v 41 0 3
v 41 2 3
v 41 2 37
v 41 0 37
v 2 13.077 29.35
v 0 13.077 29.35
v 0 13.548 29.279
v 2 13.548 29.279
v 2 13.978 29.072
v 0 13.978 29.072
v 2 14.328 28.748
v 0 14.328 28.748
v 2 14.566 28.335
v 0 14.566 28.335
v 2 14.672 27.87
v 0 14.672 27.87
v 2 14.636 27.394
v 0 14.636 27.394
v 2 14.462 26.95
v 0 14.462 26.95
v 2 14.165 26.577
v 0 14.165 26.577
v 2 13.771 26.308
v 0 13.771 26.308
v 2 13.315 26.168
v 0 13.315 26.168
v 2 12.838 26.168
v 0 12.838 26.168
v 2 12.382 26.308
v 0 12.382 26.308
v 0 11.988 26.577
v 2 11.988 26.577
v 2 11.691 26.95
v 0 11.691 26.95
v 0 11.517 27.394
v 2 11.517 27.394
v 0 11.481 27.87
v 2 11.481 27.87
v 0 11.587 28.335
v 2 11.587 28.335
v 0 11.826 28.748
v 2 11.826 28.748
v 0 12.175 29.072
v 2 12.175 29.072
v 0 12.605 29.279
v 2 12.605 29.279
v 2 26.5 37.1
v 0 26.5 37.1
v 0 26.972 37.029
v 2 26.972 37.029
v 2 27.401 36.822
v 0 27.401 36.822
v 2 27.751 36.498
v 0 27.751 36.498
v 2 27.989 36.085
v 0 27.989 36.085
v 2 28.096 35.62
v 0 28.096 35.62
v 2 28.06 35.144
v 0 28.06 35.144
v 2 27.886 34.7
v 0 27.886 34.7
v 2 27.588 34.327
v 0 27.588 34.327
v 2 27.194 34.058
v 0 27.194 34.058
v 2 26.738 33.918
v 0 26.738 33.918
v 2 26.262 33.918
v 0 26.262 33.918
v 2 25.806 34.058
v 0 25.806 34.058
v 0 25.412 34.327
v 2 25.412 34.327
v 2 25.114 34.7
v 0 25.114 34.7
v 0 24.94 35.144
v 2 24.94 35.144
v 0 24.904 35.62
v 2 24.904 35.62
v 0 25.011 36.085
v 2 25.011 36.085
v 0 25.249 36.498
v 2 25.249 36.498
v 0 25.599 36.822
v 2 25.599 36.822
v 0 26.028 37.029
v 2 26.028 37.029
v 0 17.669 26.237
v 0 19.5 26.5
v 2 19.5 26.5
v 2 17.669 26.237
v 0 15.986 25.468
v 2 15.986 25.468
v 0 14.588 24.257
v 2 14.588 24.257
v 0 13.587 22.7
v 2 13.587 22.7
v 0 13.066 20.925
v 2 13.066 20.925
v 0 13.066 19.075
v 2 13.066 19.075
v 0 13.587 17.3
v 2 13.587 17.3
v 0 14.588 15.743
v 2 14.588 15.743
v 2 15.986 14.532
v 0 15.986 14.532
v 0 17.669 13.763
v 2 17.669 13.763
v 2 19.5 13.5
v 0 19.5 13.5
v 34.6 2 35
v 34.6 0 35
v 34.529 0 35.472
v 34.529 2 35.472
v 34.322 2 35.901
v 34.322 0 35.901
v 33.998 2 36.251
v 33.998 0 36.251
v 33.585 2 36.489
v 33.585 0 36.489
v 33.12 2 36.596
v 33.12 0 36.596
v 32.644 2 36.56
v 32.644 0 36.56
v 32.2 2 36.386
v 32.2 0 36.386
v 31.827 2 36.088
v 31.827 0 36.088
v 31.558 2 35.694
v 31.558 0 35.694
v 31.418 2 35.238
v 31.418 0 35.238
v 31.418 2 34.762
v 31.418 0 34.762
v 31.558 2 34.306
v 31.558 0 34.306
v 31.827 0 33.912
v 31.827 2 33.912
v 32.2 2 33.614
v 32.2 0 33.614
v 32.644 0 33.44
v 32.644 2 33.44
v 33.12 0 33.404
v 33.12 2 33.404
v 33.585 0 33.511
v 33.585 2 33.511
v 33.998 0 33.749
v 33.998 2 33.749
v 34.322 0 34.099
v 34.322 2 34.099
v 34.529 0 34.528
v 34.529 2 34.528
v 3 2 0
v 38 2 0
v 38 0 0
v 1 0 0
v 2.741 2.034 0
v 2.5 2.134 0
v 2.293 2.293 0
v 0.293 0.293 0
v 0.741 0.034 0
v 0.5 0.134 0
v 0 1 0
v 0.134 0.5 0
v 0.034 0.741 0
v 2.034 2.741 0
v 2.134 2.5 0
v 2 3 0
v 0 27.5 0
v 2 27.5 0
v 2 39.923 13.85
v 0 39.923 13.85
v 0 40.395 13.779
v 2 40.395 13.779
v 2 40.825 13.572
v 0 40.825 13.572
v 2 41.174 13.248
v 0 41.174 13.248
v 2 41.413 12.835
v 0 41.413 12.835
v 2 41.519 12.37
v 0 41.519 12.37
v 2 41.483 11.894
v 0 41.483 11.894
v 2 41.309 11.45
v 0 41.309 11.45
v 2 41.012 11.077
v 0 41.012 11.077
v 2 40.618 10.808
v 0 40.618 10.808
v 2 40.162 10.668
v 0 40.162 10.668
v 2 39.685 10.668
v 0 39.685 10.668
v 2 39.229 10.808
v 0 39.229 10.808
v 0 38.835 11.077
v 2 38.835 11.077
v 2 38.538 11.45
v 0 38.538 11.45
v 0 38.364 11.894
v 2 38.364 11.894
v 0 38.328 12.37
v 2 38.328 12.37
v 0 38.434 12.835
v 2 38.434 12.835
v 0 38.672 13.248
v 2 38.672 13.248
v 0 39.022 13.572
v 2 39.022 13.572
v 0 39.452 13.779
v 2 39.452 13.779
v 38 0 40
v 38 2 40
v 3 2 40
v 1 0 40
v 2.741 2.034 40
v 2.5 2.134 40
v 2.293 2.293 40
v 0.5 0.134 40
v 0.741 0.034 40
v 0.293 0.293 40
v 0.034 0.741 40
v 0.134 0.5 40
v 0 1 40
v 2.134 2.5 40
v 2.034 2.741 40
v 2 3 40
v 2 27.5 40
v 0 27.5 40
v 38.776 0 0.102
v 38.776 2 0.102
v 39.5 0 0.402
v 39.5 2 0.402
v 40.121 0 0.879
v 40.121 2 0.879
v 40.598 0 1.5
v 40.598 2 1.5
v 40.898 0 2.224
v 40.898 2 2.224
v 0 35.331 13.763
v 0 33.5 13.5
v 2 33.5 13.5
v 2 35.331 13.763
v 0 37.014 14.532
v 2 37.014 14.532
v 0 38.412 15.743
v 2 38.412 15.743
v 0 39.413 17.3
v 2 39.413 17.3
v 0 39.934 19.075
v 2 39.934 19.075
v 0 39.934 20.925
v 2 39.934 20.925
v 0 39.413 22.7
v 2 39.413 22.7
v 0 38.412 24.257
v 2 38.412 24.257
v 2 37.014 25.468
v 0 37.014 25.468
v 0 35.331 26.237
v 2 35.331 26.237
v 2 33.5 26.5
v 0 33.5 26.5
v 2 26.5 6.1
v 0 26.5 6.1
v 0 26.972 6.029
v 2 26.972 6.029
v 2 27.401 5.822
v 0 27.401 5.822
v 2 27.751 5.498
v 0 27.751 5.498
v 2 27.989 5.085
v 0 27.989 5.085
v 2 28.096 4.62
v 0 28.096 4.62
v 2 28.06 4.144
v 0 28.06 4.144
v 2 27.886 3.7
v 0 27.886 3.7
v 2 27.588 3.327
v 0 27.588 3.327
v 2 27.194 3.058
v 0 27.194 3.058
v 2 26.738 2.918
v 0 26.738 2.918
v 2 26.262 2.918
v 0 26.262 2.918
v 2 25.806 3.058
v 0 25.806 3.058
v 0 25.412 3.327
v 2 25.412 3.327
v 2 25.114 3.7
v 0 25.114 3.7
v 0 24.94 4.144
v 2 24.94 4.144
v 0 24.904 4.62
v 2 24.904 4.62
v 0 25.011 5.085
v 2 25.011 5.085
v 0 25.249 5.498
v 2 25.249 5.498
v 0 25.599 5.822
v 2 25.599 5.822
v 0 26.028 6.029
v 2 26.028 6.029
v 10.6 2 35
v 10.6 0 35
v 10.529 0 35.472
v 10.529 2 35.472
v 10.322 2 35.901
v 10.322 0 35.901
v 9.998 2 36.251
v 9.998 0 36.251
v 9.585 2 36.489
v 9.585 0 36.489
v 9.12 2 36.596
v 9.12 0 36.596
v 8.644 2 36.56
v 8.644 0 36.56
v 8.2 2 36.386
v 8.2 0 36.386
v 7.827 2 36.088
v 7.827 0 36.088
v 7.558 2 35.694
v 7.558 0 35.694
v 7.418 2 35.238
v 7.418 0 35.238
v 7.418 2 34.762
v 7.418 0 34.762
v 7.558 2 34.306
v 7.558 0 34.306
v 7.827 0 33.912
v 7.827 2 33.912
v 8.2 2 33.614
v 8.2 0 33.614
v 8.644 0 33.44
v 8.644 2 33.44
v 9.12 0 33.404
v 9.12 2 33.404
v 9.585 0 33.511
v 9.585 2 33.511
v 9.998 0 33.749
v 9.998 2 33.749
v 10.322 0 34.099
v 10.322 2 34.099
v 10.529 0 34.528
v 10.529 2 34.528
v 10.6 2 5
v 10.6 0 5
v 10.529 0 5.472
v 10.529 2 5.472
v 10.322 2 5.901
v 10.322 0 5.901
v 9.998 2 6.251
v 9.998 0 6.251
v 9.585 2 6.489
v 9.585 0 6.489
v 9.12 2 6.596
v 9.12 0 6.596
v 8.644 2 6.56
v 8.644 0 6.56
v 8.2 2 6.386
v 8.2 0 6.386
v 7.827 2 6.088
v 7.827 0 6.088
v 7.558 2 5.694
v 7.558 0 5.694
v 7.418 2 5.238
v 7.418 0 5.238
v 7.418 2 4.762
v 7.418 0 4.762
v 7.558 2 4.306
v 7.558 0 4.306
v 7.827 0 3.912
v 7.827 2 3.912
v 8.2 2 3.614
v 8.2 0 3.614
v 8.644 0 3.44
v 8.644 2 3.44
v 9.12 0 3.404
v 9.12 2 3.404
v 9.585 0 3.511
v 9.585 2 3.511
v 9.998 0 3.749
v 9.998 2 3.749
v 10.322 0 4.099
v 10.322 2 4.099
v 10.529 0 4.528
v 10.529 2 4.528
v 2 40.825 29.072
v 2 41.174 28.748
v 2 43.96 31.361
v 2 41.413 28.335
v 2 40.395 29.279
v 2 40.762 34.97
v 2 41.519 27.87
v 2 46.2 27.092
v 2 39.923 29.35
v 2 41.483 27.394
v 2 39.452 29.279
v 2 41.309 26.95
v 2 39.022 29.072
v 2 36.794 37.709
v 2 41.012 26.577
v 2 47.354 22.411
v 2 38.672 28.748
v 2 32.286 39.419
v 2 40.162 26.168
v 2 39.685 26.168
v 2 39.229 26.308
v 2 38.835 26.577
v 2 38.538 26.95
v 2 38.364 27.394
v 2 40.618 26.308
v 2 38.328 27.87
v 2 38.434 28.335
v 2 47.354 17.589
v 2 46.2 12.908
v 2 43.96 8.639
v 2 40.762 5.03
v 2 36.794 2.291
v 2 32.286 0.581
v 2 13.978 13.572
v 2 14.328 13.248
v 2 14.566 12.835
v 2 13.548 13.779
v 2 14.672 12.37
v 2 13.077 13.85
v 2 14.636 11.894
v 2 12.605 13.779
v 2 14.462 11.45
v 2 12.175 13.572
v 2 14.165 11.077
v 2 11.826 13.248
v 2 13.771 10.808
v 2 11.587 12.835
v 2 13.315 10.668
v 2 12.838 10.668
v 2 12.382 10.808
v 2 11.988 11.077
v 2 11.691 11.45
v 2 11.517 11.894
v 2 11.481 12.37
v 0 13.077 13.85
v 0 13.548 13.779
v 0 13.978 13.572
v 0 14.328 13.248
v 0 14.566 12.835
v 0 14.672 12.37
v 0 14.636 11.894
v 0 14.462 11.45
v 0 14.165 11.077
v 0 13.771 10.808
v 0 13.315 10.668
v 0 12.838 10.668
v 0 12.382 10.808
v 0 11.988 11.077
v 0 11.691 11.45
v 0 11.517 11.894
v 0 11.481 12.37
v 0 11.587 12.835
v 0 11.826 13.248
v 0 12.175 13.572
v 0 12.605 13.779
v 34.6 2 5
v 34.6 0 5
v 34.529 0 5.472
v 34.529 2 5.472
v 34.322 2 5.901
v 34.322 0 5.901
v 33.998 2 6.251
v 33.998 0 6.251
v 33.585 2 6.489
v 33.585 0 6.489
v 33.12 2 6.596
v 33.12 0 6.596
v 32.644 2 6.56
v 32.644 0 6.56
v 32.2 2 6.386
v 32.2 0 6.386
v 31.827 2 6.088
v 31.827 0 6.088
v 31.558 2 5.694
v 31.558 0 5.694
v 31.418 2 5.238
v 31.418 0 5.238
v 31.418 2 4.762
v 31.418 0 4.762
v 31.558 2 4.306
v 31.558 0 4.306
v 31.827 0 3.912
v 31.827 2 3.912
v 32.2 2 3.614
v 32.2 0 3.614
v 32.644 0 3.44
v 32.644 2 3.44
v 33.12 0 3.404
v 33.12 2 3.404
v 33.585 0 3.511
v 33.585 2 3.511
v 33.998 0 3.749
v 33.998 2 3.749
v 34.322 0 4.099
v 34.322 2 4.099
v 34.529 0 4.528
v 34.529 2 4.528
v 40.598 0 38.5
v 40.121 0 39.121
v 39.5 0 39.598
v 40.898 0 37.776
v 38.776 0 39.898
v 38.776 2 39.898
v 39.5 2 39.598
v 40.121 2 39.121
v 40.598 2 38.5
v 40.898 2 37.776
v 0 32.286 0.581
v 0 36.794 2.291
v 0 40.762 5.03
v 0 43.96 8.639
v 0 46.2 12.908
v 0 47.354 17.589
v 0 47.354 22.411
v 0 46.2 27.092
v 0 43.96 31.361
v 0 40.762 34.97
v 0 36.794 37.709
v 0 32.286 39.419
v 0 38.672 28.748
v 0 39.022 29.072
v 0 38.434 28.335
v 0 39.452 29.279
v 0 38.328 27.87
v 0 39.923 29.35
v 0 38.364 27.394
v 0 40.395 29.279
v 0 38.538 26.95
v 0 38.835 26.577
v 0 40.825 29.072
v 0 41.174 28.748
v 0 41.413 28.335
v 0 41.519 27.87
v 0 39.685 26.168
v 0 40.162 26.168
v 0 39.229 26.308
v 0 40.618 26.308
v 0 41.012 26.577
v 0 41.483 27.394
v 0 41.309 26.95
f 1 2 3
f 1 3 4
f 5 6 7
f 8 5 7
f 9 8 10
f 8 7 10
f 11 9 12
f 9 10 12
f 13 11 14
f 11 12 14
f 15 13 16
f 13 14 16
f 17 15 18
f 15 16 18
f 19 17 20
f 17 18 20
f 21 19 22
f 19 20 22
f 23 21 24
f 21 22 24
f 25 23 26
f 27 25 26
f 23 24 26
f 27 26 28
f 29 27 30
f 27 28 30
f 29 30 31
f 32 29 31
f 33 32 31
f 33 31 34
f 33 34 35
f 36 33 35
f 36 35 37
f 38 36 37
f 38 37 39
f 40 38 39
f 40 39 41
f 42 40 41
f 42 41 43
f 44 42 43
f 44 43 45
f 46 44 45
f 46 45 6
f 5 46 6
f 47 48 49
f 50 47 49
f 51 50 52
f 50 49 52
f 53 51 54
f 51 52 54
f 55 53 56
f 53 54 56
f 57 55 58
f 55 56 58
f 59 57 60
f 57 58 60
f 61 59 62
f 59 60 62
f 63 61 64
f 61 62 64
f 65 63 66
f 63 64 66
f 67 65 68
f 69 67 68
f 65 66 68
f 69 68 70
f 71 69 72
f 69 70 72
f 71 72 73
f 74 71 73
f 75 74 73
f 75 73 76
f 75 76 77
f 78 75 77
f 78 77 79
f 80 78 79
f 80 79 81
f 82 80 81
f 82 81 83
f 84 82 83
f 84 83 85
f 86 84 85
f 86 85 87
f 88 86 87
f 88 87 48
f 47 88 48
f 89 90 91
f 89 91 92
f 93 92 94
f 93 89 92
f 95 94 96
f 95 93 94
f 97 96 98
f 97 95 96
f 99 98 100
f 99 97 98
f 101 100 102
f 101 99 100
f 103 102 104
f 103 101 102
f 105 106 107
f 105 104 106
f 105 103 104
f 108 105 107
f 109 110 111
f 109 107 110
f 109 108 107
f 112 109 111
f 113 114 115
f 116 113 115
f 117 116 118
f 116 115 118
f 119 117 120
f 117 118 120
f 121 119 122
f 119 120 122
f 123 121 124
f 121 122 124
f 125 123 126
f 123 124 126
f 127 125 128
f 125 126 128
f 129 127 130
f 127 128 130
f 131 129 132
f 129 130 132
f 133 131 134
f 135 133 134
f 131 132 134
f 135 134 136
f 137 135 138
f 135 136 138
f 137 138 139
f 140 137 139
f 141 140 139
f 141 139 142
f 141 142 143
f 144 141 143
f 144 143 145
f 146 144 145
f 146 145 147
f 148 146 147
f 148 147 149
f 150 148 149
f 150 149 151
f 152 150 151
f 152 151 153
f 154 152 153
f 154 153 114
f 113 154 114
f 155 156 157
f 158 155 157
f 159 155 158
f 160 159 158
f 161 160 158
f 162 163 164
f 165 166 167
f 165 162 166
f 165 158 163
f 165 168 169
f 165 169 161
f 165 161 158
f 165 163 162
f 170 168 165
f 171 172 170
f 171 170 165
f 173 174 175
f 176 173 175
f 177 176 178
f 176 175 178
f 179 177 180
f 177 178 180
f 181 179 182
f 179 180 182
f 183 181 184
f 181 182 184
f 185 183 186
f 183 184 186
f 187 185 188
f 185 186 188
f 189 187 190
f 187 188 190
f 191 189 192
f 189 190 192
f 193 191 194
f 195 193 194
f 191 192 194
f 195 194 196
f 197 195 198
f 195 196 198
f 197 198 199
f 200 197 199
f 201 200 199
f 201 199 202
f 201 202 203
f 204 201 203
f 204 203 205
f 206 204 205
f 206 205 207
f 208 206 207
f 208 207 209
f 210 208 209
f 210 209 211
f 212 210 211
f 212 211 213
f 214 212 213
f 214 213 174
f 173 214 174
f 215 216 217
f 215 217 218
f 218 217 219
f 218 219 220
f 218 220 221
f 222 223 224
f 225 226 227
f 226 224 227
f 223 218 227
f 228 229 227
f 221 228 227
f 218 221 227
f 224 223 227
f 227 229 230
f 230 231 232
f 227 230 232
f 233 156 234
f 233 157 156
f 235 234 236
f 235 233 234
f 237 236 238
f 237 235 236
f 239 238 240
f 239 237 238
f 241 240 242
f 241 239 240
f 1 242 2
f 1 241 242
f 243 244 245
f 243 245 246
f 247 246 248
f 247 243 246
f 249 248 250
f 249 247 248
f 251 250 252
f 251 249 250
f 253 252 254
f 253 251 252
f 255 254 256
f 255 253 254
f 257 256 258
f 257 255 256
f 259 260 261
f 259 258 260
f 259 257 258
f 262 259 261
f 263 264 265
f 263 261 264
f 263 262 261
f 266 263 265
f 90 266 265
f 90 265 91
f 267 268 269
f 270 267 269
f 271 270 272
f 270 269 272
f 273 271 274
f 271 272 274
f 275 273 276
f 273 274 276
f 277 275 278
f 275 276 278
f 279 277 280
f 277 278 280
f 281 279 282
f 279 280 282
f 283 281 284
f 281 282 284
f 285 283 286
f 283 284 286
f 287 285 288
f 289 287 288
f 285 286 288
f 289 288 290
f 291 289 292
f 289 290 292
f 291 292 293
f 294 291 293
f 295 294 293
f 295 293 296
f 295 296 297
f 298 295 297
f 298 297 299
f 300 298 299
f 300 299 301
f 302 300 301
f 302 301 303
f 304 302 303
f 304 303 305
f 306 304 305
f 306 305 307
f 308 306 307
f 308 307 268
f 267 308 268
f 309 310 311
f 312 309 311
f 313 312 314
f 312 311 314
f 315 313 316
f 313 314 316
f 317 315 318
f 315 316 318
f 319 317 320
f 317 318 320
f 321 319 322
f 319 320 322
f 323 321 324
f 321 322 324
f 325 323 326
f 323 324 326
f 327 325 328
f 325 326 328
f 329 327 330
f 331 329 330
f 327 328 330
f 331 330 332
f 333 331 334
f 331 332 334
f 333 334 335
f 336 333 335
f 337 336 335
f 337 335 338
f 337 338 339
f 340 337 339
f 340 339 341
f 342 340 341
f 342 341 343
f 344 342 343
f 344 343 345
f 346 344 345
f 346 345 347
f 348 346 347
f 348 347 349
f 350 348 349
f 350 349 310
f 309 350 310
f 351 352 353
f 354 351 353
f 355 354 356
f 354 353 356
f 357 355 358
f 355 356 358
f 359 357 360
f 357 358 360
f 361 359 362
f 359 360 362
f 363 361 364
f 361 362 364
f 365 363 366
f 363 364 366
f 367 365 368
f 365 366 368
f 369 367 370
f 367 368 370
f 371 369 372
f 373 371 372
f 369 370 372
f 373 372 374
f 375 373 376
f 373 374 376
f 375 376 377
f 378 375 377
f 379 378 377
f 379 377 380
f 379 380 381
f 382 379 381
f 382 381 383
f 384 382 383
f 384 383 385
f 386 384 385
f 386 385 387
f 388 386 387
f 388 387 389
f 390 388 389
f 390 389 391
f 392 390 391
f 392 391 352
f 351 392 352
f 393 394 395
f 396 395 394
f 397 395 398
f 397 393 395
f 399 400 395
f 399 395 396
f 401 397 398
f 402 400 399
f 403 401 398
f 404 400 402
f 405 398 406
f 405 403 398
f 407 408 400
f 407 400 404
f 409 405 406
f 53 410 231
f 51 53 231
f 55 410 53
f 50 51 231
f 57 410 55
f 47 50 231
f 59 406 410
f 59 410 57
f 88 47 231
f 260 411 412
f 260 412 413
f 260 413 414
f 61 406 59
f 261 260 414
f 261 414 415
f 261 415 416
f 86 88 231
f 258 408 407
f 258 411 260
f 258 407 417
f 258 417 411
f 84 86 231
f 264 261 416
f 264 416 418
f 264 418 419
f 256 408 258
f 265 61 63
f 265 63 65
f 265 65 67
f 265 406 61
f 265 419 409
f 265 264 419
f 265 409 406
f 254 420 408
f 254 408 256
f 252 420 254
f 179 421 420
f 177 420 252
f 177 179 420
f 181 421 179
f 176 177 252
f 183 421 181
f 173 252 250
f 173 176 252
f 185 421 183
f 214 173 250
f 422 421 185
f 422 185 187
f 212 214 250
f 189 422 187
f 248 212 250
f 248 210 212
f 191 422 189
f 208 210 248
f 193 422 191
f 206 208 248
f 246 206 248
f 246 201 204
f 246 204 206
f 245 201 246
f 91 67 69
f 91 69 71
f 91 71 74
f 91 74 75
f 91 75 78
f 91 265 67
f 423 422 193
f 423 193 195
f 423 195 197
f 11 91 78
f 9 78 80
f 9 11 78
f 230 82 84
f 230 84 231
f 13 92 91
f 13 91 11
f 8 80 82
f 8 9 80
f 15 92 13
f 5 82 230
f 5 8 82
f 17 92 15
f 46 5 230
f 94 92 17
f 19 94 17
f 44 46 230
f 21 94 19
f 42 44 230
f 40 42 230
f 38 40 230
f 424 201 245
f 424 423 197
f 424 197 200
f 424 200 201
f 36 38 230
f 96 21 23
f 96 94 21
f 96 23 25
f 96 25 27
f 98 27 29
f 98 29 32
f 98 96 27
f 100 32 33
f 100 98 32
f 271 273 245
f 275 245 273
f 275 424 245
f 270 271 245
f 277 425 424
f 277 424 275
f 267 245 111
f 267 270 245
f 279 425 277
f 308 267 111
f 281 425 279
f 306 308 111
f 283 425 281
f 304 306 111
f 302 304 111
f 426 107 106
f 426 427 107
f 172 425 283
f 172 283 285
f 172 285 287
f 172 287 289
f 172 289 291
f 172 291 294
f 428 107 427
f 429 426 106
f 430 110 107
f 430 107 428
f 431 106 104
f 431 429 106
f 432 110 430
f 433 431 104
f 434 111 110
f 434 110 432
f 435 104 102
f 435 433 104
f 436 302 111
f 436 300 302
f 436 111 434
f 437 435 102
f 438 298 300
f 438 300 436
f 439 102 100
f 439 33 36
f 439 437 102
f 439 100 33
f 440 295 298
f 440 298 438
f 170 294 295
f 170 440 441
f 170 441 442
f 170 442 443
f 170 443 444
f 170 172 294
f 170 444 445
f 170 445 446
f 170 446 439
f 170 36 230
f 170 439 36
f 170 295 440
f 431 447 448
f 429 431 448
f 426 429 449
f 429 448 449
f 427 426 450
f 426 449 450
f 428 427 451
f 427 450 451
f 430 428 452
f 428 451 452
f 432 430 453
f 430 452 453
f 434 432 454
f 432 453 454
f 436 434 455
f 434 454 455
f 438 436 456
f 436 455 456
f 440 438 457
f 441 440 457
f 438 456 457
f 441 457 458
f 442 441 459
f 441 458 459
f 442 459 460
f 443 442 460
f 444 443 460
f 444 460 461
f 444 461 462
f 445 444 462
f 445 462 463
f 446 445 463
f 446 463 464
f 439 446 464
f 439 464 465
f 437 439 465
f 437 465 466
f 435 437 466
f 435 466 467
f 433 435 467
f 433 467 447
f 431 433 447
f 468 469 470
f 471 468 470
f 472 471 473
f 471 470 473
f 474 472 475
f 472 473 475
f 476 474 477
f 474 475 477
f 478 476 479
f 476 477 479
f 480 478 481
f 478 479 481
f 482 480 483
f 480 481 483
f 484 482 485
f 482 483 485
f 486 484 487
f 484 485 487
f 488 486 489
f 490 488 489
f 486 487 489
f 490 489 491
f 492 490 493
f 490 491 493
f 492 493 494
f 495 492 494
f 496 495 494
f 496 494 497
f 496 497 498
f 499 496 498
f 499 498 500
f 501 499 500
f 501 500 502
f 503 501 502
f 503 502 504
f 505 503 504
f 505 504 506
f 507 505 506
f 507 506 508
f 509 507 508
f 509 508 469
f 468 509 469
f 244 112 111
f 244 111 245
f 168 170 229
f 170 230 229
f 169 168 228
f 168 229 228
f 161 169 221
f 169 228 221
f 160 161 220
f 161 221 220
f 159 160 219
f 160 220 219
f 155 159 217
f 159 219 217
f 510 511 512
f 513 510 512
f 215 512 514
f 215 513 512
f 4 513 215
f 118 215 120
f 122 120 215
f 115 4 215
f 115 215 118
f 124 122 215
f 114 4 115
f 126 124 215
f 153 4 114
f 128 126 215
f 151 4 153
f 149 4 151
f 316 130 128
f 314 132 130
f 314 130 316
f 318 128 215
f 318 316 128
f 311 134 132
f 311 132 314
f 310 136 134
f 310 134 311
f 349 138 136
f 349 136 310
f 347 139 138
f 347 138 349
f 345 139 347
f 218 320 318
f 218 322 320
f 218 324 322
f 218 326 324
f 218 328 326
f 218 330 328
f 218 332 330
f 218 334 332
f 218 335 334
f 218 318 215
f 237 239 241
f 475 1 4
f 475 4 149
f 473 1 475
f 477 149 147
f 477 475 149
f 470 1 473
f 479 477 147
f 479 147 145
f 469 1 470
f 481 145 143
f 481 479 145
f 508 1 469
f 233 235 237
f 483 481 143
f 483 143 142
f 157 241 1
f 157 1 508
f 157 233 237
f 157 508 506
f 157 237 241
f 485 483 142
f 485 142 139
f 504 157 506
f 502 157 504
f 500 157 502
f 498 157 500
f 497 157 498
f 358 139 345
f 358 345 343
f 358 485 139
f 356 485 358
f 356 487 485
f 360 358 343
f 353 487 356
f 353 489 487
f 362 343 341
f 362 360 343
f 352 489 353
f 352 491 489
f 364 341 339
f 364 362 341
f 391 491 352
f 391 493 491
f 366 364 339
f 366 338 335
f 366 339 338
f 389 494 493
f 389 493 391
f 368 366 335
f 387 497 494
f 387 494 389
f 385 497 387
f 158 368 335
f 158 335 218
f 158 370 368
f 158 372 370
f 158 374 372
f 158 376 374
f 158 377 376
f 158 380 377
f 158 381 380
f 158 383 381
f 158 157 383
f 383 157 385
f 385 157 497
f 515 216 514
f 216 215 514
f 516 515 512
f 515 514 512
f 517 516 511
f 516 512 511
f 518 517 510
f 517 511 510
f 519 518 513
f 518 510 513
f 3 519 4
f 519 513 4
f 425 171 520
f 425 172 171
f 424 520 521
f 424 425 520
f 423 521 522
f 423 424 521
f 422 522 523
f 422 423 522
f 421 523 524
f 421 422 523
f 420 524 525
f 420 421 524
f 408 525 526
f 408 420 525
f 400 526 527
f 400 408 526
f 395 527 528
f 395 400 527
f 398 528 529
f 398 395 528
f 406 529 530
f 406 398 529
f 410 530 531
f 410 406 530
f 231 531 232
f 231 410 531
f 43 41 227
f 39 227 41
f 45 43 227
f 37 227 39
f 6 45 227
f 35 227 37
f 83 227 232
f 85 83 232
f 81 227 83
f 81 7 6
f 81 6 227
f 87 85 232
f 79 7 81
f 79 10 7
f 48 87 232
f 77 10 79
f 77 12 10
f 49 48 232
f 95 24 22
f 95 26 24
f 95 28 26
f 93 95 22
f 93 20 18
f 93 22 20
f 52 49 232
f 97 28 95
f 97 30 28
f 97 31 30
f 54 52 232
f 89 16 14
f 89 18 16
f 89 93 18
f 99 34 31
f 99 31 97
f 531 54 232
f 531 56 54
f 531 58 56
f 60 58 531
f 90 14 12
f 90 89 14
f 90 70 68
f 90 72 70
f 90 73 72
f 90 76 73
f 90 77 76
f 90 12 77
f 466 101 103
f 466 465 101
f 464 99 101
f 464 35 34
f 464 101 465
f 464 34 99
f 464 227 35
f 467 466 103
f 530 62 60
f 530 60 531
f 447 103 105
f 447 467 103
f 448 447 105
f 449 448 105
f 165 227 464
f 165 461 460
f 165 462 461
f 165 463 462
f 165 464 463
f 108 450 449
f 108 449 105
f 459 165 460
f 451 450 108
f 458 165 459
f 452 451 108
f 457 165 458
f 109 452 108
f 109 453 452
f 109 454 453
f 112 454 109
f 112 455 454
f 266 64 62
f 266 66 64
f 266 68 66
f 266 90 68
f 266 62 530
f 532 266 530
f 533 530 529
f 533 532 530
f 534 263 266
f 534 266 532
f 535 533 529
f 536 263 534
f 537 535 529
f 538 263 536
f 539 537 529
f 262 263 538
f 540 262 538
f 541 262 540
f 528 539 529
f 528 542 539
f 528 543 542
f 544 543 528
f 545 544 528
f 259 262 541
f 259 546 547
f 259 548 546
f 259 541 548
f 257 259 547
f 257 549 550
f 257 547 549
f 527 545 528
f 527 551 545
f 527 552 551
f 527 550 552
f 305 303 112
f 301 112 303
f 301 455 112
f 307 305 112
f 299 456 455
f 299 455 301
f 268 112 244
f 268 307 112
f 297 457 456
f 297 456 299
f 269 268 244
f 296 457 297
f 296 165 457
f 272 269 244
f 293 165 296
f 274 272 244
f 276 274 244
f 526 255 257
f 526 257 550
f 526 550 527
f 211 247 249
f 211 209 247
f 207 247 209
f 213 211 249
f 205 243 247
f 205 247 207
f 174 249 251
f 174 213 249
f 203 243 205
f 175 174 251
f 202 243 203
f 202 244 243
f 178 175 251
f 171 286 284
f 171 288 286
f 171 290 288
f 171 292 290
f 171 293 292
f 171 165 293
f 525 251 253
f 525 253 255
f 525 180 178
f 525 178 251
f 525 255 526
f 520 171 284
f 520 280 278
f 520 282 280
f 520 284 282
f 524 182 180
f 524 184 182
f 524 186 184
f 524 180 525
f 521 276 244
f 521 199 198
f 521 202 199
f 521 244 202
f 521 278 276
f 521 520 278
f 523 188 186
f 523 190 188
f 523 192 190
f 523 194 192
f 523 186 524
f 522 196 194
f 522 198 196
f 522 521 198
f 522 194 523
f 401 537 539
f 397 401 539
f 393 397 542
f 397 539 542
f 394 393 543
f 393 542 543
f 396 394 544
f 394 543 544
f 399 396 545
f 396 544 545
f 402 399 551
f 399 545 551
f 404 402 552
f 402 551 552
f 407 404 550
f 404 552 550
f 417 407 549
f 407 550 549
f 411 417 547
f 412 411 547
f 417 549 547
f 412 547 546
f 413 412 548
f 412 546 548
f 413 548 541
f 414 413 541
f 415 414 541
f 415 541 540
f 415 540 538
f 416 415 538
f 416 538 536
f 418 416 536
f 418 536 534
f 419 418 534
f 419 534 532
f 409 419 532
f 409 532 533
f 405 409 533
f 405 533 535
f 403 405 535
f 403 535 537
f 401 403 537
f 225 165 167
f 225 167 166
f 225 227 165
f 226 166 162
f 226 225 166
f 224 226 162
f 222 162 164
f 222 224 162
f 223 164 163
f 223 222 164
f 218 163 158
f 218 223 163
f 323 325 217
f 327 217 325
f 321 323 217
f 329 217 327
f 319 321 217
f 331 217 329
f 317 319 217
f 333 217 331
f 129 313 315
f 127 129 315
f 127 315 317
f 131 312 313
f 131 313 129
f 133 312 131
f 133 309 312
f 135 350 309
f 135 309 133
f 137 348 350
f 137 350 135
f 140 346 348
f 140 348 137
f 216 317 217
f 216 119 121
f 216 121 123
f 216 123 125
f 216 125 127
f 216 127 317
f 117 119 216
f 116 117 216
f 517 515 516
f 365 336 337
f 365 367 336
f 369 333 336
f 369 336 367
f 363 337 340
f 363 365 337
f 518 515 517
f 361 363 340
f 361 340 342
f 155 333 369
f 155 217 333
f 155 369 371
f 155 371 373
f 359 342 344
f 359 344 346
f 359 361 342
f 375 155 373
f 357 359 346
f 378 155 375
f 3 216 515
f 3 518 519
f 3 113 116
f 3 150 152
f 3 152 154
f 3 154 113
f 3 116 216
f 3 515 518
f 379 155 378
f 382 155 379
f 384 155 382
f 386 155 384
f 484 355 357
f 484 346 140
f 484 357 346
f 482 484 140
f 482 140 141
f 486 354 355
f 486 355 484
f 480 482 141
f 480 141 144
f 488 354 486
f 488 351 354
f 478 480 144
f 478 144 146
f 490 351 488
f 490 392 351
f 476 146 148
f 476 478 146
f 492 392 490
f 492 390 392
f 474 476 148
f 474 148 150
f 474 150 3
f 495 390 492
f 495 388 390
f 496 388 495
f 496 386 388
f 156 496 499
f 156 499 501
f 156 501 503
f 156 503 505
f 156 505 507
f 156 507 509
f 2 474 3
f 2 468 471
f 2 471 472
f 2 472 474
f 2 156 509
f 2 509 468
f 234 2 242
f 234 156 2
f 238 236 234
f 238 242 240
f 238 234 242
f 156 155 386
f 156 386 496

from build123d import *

# Parameters (mm, degrees)
EXTRUDE_1_DEPTH     = 40
FILLET_1_R          = 1
SKETCH_3_R          = 1.6
CUT_EXTRUDE_1_DEPTH = 40
FILLET_2_R          = 3
FILLET_3_RADIUS     = 20
FILLET_3_LENGTH     = 2
SKETCH_4_R          = 1.6
CUT_EXTRUDE_2_DEPTH = 40


with BuildPart() as part:
    # 草图1 → 凸台-拉伸1 (new body)
    with BuildSketch(Plane.XY):
        Polygon((0, 0), (0, 47.5), (2, 47.5), (2, 2), (41, 2), (41, 0), align=None)
    extrude(amount=EXTRUDE_1_DEPTH)

    # 圆角1
    fillet_1_edges = [part.edges().sort_by_distance(p)[0] for p in [
        (0, 0, 20),
        (2, 2, 20),
    ]]
    fillet(fillet_1_edges, radius=FILLET_1_R)

    # 草图3 → 切除-拉伸1 (cut)
    with BuildSketch(Plane.XZ):
        with Locations((33, 35)):
            Circle(SKETCH_3_R)
        with Locations((33, 5)):
            Circle(SKETCH_3_R)
        with Locations((9, 35)):
            Circle(SKETCH_3_R)
        with Locations((9, 5)):
            Circle(SKETCH_3_R)
    extrude(amount=-CUT_EXTRUDE_1_DEPTH, mode=Mode.SUBTRACT)

    # 圆角2
    fillet_2_edges = [part.edges().sort_by_distance(p)[0] for p in [
        (41, 1, 0),
        (41, 1, 40),
    ]]
    fillet(fillet_2_edges, radius=FILLET_2_R)

    # 圆角3: full round fillet: the end face becomes a half cylinder, R = half its width
    fillet_3_face = Plane((1, 47.5, 20), x_dir=(1, 0, 0), z_dir=(0, 1, 0))  # on the end face: x along it, z out of the body
    fillet_3_slab = fillet_3_face.offset(-FILLET_3_RADIUS / 2) * Box(FILLET_3_LENGTH, 2 * FILLET_3_RADIUS, FILLET_3_RADIUS, mode=Mode.PRIVATE)  # the body's end, R deep
    fillet_3_round = Plane((1, 27.5, 20), x_dir=(0, 1, 0), z_dir=(1, 0, 0)) * Cylinder(FILLET_3_RADIUS, FILLET_3_LENGTH, mode=Mode.PRIVATE)  # its axis R under the face
    add(fillet_3_slab - fillet_3_round, mode=Mode.SUBTRACT)

    # 草图4 → 切除-拉伸2 (cut)
    with BuildSketch(Plane.ZY):
        with Locations((35.5, 26.5)):
            Circle(SKETCH_4_R)
        with Locations((27.75, 13.076606241)):
            Circle(SKETCH_4_R)
        with Locations((12.25, 13.076606241)):
            Circle(SKETCH_4_R)
        with Locations((4.5, 26.5)):
            Circle(SKETCH_4_R)
        with Locations((12.25, 39.923393759)):
            Circle(SKETCH_4_R)
        with Locations((27.75, 39.923393759)):
            Circle(SKETCH_4_R)
        with BuildLine():
            Line((13.5, 19.5), (13.5, 33.5))
            ThreePointArc((13.5, 33.5), (20, 40), (26.5, 33.5))
            Line((26.5, 33.5), (26.5, 19.5))
            ThreePointArc((26.5, 19.5), (20, 13), (13.5, 19.5))
        make_face()
    extrude(amount=-CUT_EXTRUDE_2_DEPTH, mode=Mode.SUBTRACT)


solid = part.part
